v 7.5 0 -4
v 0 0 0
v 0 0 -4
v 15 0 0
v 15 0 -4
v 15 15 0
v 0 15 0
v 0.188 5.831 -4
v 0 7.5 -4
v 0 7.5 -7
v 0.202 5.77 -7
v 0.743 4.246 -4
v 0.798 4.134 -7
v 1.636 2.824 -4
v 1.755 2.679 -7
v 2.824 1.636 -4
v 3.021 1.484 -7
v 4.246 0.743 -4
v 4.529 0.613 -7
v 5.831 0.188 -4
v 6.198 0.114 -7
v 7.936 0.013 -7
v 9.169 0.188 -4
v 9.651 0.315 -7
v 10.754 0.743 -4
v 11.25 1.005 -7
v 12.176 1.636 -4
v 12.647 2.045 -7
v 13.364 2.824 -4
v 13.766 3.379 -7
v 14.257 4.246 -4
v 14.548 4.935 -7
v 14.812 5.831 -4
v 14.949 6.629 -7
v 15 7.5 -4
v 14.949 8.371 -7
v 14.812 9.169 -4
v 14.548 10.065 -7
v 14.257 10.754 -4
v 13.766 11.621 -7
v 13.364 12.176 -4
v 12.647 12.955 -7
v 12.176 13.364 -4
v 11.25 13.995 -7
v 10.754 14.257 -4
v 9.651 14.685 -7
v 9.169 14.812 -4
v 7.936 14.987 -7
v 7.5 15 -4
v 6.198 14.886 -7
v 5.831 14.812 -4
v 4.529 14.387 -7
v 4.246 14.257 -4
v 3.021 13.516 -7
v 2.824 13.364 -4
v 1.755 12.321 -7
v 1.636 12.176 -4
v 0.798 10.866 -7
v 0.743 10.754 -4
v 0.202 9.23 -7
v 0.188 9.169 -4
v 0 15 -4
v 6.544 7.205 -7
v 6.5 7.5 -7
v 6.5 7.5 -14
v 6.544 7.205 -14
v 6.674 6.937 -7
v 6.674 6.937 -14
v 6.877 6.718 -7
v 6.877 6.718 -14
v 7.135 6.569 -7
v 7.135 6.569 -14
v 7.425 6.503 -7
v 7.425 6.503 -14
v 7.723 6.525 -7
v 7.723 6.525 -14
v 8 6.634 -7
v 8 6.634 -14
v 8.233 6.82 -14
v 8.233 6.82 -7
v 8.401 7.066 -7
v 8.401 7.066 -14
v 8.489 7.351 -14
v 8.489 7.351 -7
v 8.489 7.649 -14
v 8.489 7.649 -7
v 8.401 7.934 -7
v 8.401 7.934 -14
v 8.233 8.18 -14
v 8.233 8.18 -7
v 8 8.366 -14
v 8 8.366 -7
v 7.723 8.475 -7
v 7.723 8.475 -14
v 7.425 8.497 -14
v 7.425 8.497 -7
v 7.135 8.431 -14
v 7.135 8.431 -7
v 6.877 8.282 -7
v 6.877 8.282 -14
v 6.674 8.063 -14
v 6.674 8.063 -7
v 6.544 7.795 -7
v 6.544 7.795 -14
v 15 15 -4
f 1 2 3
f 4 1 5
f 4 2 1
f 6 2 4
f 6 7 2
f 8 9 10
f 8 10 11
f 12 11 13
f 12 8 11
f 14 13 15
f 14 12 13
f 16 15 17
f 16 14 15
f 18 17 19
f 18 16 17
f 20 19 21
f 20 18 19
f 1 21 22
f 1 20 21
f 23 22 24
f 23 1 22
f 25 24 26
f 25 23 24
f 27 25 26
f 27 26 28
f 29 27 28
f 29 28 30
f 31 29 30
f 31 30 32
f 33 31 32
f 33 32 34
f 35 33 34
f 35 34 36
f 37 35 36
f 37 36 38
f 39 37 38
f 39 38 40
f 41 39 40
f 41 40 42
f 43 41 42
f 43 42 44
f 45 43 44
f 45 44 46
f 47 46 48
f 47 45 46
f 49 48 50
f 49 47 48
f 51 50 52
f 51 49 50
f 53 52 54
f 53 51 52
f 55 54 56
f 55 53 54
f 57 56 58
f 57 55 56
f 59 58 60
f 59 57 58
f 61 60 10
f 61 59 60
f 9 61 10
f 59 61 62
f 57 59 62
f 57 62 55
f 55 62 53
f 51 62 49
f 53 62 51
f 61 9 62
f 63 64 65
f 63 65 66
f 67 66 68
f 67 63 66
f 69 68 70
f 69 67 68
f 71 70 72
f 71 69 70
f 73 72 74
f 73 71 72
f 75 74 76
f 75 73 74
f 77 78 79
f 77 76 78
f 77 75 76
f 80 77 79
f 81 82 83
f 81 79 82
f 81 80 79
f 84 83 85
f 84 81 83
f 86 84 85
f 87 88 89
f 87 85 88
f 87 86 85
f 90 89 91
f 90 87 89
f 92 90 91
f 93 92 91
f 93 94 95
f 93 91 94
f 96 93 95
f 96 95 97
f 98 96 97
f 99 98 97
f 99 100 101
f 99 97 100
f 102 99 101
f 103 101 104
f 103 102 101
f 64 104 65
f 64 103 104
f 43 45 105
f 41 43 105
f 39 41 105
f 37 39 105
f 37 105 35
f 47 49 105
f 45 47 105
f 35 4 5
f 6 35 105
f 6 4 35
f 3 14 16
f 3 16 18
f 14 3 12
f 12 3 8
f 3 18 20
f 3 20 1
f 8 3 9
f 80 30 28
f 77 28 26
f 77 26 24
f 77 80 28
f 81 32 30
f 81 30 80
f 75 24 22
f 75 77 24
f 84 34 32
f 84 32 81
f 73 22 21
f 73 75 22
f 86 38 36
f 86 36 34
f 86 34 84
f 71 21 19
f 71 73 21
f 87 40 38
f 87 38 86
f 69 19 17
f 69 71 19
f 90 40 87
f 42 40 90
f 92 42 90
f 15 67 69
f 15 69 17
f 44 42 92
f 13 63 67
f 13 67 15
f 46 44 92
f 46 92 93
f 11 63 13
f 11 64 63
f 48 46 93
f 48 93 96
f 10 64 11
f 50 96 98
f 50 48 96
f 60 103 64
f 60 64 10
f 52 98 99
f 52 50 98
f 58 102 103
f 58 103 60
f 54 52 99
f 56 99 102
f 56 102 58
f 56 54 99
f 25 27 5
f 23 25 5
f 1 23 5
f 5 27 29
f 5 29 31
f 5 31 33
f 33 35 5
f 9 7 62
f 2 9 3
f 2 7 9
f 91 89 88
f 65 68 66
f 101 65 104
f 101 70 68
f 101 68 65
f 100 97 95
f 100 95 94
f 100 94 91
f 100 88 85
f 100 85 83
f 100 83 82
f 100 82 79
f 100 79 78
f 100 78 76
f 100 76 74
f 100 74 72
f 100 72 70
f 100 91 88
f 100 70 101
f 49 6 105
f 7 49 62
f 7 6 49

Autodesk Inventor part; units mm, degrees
ref_plane "YZ Plane" through (0, 0, 0) normal (1, 0, 0) x (0, 1, 0)
ref_plane "XZ Plane" through (0, 0, 0) normal (0, 1, 0) x (-1, 0, 0)
ref_plane "XY Plane" through (0, 0, 0) normal (0, 0, 1) x (1, 0, 0)
sketch "Sketch1" plane through (0, 0, 0) normal (0, 0, 1) x (1, 0, 0)
  line L0 (0, 0) -> (15, 0)
  line L1 (15, 0) -> (15, 15)
  line L2 (15, 15) -> (0, 15)
  line L3 (0, 15) -> (0, 0)
  dimension "d0" = 15
  dimension "d1" = 15
extrude "Extrusion1" add sketch "Sketch1" against normal blind 4
sketch "Sketch2" plane through (0, 0, -4) normal (0, 0, -1) x (-1, 0, 0)
  circle A0 centre (-7.5, 7.5) radius 7.5
  point P0 (0, 0)
  dimension "d4" = 15
extrude "Extrusion2" add sketch "Sketch2" along normal blind 3
sketch "Sketch3" plane through (7.5, 7.5, -7) normal (0, 0, -1) x (-1, 0, 0)
  circle A0 centre (0, 0) radius 1
  point P0 (7.5, -7.5)
  dimension "d7" = 2
extrude "Extrusion3" add sketch "Sketch3" along normal blind 7
sketch "Sketch4" plane through (0, 0, 0) normal (0, 0, 1) x (1, 0, 0)
  line L0 (0.2915, 14.885) -> (14.8969, 14.885) construction
  line L1 (14.8969, 14.885) -> (14.8969, 0.1242) construction
  line L2 (14.8969, 0.1242) -> (0.2915, 0.1242) construction
  line L3 (0.2915, 0.1242) -> (0.2915, 14.885) construction
  point P0 (0, 0)
sketch "Sketch5" plane through (0, 0, 0) normal (0, -1, 0) x (1, 0, 0)
  line L0 (0.1529, -0.1223) -> (14.8622, -0.1223) construction
  line L1 (14.8622, -0.1223) -> (14.8622, -3.792) construction
  line L2 (14.8622, -3.792) -> (0.1529, -3.792) construction
  line L3 (0.1529, -3.792) -> (0.1529, -0.1223) construction
  point P0 (0, 0)
properties part number "Input Motor" material "ABS Plastic"
